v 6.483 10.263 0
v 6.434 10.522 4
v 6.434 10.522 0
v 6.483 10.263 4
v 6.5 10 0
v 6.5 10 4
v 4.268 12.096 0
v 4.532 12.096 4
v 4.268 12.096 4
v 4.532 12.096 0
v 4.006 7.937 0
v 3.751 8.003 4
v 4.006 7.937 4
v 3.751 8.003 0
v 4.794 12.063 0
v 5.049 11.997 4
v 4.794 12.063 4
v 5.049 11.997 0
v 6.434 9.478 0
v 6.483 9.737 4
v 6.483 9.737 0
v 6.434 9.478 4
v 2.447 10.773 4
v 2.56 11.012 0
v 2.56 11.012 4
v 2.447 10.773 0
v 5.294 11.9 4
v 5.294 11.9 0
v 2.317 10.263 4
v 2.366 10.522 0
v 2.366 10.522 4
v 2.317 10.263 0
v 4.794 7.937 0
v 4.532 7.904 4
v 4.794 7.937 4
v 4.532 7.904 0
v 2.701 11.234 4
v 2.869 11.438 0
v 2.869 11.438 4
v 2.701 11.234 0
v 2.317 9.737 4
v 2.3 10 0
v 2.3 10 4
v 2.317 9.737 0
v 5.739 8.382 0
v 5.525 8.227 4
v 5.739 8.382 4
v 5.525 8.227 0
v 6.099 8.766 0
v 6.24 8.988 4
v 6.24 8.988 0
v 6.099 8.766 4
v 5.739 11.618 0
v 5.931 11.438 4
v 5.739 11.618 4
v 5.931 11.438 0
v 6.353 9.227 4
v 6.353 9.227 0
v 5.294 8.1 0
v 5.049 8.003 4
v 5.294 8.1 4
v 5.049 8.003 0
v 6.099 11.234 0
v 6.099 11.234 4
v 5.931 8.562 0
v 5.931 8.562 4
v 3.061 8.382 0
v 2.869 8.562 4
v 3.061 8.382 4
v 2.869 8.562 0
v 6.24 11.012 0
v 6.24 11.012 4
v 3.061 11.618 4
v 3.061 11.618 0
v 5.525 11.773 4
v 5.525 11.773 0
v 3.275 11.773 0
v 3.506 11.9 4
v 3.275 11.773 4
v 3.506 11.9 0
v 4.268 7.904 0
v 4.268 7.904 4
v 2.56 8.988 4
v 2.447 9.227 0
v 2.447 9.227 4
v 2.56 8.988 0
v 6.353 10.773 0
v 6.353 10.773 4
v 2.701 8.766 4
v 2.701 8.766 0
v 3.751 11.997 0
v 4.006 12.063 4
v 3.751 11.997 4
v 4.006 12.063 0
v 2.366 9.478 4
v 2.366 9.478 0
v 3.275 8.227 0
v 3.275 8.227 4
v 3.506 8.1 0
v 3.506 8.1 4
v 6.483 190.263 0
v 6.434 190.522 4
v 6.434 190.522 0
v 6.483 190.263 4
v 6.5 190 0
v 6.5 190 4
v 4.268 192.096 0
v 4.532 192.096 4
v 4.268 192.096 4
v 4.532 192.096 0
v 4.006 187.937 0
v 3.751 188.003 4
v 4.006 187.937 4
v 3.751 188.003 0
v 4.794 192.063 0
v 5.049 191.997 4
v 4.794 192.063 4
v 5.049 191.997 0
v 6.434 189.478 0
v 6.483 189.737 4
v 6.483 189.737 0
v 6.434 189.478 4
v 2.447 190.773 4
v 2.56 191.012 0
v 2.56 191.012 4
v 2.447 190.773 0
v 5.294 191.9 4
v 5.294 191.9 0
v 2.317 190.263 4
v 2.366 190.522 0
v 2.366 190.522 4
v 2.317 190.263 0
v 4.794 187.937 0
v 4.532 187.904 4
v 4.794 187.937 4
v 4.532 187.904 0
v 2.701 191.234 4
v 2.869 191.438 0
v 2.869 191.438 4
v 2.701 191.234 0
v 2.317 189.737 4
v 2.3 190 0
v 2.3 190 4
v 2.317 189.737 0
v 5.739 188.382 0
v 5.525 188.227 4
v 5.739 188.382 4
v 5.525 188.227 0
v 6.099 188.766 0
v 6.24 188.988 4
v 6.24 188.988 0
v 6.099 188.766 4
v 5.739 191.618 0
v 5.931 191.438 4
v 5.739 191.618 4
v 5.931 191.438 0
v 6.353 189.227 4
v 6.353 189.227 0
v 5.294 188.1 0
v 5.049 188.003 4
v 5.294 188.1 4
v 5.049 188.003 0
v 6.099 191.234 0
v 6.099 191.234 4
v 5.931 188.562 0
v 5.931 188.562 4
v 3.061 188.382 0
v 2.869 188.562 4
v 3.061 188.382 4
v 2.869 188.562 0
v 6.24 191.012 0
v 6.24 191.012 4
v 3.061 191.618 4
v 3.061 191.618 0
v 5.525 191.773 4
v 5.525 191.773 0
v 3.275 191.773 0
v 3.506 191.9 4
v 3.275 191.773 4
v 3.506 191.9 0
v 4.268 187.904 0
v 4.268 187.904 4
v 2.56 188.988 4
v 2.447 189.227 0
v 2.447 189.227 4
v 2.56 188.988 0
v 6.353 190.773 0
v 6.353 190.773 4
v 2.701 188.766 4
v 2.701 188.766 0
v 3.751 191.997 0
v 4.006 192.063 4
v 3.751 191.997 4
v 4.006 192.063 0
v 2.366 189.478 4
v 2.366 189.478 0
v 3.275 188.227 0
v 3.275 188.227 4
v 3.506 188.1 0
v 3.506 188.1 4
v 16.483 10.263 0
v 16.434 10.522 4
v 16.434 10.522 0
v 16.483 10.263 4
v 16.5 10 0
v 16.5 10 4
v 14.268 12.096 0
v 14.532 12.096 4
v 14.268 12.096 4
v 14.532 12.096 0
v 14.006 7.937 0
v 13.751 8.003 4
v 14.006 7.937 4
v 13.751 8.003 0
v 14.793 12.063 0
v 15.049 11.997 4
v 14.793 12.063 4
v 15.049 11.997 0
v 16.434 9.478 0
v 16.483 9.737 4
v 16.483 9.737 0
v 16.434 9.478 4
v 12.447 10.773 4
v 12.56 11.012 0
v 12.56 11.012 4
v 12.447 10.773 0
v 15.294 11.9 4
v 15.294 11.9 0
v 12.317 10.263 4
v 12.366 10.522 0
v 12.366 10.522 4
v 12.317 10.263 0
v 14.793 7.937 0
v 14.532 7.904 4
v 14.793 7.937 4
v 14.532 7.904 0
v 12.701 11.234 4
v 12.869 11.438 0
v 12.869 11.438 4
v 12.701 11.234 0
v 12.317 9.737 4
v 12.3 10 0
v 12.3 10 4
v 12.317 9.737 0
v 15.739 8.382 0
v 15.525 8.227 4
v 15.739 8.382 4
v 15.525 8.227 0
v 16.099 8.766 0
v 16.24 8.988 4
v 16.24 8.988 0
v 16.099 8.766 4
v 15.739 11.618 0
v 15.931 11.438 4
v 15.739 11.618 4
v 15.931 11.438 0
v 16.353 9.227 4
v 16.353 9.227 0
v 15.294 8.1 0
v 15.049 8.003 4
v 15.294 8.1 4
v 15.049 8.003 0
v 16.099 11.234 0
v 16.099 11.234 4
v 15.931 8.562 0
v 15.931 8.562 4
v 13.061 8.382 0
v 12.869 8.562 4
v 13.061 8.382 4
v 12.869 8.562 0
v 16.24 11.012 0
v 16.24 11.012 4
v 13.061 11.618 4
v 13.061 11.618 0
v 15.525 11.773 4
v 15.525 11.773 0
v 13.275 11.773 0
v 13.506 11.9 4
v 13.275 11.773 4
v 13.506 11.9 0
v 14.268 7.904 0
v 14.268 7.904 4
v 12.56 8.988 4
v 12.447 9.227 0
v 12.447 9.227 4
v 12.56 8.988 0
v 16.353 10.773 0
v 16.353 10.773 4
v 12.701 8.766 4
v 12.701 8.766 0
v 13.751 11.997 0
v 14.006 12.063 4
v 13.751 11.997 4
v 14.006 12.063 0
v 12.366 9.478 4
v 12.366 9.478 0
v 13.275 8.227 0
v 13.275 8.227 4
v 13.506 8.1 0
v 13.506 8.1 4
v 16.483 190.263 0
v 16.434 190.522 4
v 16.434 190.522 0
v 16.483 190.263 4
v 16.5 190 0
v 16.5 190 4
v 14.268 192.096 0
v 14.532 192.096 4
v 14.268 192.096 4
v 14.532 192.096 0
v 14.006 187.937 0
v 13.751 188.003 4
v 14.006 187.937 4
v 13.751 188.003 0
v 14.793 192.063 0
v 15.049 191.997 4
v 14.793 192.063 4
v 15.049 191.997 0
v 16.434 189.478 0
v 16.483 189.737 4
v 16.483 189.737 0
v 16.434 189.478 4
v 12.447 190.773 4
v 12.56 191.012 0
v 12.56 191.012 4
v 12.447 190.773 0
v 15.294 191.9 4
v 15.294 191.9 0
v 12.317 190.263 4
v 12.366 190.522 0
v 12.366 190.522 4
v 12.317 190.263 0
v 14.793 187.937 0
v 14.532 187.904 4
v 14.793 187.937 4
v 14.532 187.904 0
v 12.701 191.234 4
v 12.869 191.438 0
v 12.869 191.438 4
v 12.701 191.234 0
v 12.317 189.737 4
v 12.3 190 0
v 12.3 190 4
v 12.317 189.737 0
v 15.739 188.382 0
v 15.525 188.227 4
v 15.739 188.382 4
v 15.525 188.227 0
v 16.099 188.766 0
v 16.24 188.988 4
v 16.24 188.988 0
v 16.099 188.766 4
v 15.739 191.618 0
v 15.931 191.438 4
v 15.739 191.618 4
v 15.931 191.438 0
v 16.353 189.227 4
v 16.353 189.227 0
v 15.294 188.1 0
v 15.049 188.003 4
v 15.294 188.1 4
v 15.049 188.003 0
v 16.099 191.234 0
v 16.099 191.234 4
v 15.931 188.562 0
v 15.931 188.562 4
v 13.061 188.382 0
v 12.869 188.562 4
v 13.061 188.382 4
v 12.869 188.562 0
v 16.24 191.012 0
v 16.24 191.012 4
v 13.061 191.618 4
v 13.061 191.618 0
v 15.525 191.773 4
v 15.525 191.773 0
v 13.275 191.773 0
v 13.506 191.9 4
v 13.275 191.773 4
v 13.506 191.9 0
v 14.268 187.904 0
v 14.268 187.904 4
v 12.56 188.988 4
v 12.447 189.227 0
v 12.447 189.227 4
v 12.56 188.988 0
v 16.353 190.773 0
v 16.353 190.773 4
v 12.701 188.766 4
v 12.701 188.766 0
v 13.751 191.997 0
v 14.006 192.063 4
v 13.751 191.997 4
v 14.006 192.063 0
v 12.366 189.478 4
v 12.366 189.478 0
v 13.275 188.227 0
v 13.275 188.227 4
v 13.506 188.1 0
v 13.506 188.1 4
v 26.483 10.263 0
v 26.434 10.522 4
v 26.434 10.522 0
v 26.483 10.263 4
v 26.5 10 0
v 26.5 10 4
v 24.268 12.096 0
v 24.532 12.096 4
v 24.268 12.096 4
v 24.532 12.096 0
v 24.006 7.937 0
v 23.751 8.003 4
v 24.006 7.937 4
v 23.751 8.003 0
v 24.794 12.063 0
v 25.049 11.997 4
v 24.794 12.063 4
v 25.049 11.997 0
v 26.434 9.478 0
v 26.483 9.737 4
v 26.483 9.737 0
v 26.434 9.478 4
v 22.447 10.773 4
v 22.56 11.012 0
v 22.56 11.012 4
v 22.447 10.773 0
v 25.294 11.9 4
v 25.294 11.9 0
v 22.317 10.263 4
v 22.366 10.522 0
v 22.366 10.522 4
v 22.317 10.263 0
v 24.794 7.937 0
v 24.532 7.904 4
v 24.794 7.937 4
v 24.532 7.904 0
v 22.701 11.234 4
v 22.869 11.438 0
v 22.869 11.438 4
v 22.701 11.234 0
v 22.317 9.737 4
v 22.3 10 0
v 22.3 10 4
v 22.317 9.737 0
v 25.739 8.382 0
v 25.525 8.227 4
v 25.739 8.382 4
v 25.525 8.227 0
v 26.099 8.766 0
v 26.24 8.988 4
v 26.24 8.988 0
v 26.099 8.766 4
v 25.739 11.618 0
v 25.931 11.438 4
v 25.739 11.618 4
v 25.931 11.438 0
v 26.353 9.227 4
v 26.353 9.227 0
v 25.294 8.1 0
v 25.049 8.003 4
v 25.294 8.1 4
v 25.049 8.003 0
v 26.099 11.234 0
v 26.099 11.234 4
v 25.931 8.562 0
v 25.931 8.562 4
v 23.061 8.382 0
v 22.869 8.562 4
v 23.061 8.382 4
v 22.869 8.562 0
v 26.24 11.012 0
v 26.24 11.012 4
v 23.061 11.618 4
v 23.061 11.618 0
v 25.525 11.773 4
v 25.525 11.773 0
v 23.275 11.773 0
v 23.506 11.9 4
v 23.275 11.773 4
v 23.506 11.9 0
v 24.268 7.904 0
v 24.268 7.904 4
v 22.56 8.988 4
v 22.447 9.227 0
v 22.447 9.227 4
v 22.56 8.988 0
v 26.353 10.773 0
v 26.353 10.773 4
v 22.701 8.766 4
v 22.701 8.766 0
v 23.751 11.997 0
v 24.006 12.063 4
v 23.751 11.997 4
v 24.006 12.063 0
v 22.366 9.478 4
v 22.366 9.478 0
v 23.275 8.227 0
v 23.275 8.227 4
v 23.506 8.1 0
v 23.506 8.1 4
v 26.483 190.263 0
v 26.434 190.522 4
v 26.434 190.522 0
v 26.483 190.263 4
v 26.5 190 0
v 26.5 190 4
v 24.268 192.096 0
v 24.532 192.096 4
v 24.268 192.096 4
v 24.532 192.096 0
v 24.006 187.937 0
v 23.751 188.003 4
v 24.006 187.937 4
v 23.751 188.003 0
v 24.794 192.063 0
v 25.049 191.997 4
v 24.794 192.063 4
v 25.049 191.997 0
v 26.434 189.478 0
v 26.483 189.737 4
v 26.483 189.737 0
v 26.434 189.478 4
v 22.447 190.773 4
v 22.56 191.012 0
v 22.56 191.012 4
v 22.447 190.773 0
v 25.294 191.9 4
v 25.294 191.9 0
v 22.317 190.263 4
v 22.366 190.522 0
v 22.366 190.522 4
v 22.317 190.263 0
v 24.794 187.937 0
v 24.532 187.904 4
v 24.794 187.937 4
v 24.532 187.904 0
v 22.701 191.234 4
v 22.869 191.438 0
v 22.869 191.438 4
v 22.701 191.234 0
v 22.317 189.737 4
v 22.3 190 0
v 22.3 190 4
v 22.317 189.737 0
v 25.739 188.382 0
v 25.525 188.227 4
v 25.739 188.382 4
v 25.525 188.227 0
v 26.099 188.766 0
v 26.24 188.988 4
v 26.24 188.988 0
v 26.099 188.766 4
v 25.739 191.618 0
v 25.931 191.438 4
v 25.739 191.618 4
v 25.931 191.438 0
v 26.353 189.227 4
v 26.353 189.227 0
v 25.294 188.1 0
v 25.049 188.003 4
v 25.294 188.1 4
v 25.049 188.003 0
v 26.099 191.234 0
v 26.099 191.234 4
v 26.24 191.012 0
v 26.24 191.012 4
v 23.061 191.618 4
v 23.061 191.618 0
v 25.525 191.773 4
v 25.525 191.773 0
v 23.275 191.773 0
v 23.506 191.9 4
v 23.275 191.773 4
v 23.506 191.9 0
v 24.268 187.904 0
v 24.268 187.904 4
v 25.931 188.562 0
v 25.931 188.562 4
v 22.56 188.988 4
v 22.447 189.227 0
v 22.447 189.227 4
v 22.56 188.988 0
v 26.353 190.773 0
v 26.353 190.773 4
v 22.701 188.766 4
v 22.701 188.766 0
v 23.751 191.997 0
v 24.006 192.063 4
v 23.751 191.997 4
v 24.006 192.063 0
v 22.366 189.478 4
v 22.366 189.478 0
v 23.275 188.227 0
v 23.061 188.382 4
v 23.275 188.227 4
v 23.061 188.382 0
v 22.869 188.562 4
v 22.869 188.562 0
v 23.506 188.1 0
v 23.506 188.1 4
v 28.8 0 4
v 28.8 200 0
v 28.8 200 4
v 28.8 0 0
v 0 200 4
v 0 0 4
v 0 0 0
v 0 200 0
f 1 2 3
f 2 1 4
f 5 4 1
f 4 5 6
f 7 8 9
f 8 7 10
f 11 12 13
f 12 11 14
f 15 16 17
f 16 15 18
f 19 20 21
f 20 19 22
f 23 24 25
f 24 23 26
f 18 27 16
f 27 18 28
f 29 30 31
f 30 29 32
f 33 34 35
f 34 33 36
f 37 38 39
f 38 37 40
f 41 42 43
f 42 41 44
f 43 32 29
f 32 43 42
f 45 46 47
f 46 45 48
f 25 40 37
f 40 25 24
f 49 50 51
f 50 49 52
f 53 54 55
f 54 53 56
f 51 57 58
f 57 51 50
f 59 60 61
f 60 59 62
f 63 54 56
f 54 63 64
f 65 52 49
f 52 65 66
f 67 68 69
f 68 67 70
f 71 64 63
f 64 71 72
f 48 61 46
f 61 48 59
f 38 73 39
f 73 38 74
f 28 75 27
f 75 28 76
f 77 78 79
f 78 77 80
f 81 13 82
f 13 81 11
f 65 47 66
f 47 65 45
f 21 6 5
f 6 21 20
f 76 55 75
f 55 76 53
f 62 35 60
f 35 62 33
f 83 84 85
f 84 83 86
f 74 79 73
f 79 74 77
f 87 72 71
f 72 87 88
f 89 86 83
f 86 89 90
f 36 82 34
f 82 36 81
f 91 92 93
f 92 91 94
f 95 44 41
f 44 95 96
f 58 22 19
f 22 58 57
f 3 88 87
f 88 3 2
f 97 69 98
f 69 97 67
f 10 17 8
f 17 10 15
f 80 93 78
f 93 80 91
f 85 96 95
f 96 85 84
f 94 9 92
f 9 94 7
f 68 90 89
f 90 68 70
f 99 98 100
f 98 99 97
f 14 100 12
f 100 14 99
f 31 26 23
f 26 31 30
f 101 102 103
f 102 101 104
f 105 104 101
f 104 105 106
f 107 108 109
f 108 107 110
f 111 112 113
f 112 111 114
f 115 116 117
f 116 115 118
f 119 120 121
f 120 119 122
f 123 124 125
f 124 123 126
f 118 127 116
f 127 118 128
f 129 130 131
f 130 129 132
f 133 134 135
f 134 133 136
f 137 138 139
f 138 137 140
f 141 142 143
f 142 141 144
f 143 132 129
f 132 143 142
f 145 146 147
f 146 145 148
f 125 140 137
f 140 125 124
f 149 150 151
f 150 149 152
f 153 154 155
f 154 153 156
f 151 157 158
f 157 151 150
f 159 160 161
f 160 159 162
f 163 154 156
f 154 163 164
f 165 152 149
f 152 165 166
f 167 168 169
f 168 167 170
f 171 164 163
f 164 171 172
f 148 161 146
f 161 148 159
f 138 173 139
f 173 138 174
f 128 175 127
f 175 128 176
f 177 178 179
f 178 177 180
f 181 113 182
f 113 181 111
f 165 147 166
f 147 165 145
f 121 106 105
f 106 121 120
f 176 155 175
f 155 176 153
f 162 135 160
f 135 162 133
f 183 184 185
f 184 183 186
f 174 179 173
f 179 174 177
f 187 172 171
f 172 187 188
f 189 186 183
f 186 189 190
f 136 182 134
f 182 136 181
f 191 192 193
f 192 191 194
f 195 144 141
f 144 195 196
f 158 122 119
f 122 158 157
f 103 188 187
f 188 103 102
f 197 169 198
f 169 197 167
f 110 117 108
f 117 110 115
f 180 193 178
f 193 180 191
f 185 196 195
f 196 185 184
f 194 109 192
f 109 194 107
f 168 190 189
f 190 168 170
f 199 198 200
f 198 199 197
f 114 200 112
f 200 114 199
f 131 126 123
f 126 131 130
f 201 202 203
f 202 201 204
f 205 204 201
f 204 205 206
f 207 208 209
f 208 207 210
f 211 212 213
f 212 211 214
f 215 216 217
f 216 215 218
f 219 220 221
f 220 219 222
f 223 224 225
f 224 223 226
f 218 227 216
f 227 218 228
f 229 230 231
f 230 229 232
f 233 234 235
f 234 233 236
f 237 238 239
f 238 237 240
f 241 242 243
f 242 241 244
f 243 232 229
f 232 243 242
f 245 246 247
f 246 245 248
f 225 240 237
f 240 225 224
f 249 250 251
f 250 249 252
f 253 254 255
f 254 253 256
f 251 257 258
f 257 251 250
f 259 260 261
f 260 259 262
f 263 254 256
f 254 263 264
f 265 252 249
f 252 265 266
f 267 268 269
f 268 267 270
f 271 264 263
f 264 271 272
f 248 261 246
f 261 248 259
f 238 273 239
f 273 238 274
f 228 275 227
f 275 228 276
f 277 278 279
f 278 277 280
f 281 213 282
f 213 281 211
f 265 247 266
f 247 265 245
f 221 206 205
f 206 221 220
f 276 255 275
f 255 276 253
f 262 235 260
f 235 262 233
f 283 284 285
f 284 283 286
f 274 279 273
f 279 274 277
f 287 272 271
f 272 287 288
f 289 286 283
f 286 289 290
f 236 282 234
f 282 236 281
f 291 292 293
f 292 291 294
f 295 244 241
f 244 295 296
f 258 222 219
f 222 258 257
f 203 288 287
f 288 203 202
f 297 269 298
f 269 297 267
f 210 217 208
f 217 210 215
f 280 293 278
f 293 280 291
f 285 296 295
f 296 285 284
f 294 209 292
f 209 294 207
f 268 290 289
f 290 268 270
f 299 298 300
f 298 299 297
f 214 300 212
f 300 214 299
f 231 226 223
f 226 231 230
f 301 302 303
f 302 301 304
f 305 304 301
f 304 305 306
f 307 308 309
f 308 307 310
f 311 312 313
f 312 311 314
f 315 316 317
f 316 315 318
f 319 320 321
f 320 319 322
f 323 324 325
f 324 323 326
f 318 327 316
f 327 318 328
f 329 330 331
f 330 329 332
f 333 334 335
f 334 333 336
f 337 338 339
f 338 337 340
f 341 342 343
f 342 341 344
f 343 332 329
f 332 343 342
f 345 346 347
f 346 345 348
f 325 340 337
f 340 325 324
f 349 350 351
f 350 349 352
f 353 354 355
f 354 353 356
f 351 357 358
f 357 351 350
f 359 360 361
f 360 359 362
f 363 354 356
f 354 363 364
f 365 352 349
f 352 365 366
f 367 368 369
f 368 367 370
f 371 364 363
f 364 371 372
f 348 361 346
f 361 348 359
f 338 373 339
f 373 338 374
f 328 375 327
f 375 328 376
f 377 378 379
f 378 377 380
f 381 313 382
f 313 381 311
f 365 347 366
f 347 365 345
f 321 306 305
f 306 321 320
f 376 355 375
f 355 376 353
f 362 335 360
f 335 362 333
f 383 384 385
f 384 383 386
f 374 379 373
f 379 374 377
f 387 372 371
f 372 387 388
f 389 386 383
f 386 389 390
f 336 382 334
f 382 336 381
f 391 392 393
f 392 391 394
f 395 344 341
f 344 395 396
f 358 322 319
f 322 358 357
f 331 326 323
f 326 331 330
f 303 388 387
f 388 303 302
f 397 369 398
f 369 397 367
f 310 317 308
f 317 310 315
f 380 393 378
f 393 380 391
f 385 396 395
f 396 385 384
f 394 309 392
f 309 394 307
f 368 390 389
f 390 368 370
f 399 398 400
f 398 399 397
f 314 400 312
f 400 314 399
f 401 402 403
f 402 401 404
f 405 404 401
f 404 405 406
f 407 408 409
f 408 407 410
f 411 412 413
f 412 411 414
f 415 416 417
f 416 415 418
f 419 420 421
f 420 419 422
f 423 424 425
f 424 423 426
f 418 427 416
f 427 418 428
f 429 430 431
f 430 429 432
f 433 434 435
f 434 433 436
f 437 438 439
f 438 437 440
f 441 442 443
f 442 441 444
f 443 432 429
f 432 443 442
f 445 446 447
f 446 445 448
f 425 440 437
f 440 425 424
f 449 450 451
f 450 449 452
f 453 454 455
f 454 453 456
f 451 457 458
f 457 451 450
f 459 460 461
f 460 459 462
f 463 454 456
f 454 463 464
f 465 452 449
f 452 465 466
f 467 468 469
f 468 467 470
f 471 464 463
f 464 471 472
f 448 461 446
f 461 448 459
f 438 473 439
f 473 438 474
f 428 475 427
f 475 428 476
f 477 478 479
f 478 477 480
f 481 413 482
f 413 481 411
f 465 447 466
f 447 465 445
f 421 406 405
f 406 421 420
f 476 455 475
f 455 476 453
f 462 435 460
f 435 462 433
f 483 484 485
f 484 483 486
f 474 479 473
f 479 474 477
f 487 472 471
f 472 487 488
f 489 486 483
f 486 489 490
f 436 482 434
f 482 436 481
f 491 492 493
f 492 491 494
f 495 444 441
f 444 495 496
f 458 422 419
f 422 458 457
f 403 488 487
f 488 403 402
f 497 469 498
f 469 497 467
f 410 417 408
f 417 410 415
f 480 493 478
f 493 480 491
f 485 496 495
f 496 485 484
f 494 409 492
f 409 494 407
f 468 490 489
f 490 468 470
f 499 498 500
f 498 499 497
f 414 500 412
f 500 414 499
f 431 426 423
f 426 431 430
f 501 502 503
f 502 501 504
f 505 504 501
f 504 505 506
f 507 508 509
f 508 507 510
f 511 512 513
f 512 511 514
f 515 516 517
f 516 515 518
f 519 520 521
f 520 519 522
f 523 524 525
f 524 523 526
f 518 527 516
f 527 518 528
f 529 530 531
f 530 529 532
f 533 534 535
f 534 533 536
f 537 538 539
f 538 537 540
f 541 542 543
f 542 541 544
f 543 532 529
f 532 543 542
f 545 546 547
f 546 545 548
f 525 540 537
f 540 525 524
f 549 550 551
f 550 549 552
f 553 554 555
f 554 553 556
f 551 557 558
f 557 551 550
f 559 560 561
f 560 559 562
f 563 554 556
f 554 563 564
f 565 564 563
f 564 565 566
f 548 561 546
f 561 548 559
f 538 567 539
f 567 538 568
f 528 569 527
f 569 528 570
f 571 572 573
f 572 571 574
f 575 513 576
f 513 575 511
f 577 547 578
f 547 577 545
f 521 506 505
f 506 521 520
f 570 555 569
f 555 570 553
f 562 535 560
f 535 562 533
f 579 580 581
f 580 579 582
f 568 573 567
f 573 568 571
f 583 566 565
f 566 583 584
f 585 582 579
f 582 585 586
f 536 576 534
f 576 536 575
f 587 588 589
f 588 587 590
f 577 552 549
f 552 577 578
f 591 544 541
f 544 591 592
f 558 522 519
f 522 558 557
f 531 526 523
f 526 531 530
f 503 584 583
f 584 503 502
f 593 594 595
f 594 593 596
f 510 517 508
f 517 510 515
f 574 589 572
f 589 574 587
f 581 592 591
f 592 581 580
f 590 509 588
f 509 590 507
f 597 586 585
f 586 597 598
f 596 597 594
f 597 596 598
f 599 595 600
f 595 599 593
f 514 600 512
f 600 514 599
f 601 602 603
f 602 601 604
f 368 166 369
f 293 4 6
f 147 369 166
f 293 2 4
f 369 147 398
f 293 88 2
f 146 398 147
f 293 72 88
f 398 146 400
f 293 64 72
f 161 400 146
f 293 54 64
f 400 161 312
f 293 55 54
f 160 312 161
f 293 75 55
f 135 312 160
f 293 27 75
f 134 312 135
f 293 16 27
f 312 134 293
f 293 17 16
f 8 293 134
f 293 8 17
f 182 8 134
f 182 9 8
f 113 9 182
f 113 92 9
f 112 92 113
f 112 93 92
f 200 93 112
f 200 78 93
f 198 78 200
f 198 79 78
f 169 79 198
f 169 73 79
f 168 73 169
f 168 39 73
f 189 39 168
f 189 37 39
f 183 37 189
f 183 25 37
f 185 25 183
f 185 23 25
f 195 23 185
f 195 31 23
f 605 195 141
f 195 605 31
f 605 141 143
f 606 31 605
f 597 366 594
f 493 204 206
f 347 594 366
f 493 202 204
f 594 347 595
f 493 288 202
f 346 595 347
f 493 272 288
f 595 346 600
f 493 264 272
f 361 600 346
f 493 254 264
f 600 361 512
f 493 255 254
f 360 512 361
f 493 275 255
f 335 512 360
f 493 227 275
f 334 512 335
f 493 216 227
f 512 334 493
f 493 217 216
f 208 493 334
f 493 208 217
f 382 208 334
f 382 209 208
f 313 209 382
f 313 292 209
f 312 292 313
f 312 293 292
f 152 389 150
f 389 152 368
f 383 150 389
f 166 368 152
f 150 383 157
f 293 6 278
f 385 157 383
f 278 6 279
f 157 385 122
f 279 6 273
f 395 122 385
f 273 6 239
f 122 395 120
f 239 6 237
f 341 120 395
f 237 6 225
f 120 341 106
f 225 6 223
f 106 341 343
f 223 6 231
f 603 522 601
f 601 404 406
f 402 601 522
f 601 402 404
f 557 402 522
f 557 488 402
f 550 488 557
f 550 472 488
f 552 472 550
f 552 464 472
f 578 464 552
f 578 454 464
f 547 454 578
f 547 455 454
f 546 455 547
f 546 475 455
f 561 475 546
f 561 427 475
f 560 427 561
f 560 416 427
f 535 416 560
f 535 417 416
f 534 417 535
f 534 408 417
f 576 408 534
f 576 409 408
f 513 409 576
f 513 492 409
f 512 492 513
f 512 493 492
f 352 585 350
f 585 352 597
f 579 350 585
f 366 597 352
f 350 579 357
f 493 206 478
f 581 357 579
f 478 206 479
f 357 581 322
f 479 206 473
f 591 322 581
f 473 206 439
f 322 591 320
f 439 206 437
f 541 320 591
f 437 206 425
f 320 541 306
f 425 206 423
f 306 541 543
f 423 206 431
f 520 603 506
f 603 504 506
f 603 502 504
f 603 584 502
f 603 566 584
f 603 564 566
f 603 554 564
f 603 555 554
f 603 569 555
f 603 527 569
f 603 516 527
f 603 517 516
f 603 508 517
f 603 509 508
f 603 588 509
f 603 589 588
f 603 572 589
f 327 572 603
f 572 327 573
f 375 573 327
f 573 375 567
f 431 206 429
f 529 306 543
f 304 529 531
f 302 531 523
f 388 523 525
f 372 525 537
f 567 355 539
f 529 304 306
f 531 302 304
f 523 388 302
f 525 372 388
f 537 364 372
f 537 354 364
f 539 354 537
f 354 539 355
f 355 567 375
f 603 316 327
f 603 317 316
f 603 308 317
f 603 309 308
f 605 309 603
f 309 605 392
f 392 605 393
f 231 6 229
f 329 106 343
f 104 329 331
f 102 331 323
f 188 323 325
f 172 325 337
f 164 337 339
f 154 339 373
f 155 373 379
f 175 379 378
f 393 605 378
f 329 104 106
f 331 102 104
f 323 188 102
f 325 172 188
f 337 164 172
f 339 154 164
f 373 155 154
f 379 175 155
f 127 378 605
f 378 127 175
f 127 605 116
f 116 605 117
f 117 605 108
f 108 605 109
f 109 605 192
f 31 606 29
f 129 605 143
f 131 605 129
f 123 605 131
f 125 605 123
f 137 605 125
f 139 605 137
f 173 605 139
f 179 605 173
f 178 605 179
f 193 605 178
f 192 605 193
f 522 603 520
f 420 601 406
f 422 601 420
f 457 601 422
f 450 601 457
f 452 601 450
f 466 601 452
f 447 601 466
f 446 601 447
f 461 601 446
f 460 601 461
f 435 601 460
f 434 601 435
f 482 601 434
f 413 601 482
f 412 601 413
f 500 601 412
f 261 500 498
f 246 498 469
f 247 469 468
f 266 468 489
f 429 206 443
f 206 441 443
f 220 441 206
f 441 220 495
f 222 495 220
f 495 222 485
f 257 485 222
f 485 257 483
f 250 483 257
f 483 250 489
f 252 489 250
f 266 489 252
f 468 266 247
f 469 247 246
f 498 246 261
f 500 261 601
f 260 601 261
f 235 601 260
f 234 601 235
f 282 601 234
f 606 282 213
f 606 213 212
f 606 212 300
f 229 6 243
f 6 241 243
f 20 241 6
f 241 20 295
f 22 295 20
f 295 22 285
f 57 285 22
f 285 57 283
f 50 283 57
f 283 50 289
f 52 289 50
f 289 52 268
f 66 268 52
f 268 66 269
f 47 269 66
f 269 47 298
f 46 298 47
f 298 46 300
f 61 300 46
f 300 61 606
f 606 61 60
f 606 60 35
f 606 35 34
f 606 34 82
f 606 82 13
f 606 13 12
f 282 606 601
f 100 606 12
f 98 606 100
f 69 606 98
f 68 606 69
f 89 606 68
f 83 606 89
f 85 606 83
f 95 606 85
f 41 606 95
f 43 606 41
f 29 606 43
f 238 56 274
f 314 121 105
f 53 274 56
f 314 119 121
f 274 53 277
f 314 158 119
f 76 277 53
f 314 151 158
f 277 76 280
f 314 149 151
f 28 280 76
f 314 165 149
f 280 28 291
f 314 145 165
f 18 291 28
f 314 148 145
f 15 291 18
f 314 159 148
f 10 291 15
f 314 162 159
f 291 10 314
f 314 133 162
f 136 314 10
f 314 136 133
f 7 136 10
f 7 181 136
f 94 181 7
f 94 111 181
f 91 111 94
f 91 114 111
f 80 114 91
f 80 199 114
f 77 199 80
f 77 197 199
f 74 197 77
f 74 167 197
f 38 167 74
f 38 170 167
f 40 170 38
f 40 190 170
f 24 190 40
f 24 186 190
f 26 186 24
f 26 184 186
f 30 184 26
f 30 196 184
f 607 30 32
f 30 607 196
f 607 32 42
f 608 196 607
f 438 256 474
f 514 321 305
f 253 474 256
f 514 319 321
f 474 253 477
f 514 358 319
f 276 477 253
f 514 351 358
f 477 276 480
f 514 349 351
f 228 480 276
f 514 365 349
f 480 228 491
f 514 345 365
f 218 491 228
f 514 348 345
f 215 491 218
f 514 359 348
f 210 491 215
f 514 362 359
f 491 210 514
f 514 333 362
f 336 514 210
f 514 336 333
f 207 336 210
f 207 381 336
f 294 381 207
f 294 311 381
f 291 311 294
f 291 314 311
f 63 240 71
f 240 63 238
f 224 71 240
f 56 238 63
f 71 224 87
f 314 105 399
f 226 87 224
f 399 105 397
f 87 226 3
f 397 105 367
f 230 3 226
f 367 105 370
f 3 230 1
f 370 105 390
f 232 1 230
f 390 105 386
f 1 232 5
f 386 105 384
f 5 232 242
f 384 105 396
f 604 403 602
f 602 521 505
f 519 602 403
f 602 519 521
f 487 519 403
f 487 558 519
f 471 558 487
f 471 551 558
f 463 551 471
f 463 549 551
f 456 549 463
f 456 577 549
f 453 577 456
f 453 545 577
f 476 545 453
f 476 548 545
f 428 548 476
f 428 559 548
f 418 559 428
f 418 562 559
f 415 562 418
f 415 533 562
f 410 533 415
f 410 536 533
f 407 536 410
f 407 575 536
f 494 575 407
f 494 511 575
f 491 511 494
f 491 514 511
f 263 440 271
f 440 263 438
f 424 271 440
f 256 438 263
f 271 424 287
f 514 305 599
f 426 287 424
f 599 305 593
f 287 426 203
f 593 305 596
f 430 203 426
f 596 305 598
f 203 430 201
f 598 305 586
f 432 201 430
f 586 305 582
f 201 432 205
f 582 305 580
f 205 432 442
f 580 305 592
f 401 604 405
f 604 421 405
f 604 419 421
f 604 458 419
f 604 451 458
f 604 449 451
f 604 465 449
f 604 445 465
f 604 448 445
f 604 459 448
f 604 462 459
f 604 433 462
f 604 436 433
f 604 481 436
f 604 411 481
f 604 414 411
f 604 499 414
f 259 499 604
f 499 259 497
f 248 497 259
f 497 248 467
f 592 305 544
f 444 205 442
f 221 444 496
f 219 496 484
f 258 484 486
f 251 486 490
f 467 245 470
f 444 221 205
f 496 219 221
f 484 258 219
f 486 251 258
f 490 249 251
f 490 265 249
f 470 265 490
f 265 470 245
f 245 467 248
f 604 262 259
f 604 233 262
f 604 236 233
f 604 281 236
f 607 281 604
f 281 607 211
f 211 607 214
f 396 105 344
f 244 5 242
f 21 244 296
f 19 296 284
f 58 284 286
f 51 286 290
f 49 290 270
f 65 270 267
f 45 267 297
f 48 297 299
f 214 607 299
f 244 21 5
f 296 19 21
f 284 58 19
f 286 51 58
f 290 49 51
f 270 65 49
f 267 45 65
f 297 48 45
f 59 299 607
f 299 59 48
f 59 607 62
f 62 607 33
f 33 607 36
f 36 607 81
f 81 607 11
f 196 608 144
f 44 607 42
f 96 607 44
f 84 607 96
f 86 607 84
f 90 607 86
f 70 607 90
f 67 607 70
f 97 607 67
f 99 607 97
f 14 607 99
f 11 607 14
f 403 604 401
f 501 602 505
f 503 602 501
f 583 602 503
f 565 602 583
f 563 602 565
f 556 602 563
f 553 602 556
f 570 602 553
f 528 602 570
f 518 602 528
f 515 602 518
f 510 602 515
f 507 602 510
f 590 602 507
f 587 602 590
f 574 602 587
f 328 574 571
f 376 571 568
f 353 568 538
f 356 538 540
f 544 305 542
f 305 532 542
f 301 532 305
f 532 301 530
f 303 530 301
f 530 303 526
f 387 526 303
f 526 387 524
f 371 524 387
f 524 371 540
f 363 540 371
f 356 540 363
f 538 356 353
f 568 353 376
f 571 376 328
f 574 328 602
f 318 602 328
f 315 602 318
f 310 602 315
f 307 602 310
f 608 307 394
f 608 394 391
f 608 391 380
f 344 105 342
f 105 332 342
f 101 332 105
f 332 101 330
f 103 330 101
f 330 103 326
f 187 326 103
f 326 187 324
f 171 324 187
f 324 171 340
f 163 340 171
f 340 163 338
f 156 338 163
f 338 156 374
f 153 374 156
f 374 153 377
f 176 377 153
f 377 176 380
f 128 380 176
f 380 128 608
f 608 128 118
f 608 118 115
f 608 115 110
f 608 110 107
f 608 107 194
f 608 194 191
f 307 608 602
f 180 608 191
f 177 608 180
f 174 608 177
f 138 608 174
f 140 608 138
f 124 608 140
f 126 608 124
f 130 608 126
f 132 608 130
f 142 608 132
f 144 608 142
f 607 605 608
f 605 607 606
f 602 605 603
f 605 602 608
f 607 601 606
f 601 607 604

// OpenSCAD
$fn = 50;

// Customizable settings
front_plate_thickness = 4;
front_plate_units = 3;

// Constants
m4_screw_hole_loose_diam = 4.2;
unit_len = 10; // 1U = 10mm
v_slot_size = 20; // 20x20mm V-Slot
rack_width = 200;
edge_offset = 0.6; // Top/bottom edge additional empty space

// Front plate generation
front_plate(front_plate_units, front_plate_thickness);

module front_plate(unit_count, thickness){
    difference(){
        union(){
            plate_height = unit_len*unit_count - edge_offset*2;
            cube([plate_height,rack_width,thickness]);
        }                        
        for(i=[1:unit_count]){ // Screw holes
            translate([-edge_offset,0,0])
            union(){
            translate([unit_len*i-unit_len/2,v_slot_size/2,-1]){
                cylinder(d=m4_screw_hole_loose_diam,h=thickness+2);
            } 
            translate([unit_len*i-unit_len/2,rack_width-v_slot_size/2,-1]){
                cylinder(d=m4_screw_hole_loose_diam,h=thickness+2);
            }       
            }               
        }
    }
}
